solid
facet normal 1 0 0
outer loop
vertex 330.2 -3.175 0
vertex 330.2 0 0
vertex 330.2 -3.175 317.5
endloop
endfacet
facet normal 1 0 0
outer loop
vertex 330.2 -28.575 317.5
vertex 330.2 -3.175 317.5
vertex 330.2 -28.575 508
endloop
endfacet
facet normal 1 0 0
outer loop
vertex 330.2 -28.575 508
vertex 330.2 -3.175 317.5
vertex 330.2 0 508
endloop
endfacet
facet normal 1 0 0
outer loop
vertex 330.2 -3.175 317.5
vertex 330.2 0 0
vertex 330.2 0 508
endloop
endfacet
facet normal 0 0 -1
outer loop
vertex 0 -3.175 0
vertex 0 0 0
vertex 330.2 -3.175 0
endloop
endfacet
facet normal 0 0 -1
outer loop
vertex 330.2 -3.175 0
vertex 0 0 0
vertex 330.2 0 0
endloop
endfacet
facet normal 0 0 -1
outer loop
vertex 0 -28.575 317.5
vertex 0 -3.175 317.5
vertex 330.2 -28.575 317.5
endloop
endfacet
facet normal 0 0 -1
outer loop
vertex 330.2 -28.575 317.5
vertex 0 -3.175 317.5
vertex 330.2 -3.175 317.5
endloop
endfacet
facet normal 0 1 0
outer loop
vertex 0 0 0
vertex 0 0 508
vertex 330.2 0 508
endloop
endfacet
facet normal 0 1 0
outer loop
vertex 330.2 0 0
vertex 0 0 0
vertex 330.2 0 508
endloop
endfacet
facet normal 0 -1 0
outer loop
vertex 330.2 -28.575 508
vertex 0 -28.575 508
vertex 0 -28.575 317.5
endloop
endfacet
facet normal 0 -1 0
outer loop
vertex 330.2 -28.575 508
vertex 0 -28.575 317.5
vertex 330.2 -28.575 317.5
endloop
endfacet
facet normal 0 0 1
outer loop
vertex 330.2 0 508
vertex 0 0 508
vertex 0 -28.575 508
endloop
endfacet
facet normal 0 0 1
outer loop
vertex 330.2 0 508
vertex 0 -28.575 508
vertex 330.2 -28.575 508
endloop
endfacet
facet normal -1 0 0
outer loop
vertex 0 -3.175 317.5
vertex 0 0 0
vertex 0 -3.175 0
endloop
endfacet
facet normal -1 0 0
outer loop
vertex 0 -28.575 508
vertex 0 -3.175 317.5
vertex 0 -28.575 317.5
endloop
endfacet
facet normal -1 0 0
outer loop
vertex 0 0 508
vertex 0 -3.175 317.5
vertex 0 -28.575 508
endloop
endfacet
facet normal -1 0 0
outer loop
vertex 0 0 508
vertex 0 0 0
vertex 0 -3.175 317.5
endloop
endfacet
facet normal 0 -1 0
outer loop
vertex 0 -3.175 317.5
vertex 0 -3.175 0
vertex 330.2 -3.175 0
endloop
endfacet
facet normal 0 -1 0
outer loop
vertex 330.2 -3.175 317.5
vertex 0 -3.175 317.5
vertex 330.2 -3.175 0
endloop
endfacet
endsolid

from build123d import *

# Parameters (mm, degrees)
F0_W     = 330.2
F0_H     = 317.5
F1_DEPTH = 3.175
F2_W     = 330.2
F2_H     = 3.175
F3_DEPTH = 190.5
F4_W     = 330.2
F4_H     = 190.5
F5_DEPTH = 25.4


with BuildPart() as f1:
    # F0 (on Front) → F1 (new body)
    with BuildSketch(Plane.XZ):
        with Locations((165.1, 158.75)):
            Rectangle(F0_W, F0_H)
    extrude(amount=F1_DEPTH)

    # F2 (on face) → F3 (join)
    with BuildSketch(Plane.XY.offset(317.5)):
        with Locations((165.1, -1.5875)):
            Rectangle(F2_W, F2_H)
    extrude(amount=F3_DEPTH)

    # F4 (on face) → F5 (join)
    with BuildSketch(Plane.XZ.offset(3.175)):
        with Locations((165.1, 412.75)):
            Rectangle(F4_W, F4_H)
    extrude(amount=F5_DEPTH)


solid = f1.part
